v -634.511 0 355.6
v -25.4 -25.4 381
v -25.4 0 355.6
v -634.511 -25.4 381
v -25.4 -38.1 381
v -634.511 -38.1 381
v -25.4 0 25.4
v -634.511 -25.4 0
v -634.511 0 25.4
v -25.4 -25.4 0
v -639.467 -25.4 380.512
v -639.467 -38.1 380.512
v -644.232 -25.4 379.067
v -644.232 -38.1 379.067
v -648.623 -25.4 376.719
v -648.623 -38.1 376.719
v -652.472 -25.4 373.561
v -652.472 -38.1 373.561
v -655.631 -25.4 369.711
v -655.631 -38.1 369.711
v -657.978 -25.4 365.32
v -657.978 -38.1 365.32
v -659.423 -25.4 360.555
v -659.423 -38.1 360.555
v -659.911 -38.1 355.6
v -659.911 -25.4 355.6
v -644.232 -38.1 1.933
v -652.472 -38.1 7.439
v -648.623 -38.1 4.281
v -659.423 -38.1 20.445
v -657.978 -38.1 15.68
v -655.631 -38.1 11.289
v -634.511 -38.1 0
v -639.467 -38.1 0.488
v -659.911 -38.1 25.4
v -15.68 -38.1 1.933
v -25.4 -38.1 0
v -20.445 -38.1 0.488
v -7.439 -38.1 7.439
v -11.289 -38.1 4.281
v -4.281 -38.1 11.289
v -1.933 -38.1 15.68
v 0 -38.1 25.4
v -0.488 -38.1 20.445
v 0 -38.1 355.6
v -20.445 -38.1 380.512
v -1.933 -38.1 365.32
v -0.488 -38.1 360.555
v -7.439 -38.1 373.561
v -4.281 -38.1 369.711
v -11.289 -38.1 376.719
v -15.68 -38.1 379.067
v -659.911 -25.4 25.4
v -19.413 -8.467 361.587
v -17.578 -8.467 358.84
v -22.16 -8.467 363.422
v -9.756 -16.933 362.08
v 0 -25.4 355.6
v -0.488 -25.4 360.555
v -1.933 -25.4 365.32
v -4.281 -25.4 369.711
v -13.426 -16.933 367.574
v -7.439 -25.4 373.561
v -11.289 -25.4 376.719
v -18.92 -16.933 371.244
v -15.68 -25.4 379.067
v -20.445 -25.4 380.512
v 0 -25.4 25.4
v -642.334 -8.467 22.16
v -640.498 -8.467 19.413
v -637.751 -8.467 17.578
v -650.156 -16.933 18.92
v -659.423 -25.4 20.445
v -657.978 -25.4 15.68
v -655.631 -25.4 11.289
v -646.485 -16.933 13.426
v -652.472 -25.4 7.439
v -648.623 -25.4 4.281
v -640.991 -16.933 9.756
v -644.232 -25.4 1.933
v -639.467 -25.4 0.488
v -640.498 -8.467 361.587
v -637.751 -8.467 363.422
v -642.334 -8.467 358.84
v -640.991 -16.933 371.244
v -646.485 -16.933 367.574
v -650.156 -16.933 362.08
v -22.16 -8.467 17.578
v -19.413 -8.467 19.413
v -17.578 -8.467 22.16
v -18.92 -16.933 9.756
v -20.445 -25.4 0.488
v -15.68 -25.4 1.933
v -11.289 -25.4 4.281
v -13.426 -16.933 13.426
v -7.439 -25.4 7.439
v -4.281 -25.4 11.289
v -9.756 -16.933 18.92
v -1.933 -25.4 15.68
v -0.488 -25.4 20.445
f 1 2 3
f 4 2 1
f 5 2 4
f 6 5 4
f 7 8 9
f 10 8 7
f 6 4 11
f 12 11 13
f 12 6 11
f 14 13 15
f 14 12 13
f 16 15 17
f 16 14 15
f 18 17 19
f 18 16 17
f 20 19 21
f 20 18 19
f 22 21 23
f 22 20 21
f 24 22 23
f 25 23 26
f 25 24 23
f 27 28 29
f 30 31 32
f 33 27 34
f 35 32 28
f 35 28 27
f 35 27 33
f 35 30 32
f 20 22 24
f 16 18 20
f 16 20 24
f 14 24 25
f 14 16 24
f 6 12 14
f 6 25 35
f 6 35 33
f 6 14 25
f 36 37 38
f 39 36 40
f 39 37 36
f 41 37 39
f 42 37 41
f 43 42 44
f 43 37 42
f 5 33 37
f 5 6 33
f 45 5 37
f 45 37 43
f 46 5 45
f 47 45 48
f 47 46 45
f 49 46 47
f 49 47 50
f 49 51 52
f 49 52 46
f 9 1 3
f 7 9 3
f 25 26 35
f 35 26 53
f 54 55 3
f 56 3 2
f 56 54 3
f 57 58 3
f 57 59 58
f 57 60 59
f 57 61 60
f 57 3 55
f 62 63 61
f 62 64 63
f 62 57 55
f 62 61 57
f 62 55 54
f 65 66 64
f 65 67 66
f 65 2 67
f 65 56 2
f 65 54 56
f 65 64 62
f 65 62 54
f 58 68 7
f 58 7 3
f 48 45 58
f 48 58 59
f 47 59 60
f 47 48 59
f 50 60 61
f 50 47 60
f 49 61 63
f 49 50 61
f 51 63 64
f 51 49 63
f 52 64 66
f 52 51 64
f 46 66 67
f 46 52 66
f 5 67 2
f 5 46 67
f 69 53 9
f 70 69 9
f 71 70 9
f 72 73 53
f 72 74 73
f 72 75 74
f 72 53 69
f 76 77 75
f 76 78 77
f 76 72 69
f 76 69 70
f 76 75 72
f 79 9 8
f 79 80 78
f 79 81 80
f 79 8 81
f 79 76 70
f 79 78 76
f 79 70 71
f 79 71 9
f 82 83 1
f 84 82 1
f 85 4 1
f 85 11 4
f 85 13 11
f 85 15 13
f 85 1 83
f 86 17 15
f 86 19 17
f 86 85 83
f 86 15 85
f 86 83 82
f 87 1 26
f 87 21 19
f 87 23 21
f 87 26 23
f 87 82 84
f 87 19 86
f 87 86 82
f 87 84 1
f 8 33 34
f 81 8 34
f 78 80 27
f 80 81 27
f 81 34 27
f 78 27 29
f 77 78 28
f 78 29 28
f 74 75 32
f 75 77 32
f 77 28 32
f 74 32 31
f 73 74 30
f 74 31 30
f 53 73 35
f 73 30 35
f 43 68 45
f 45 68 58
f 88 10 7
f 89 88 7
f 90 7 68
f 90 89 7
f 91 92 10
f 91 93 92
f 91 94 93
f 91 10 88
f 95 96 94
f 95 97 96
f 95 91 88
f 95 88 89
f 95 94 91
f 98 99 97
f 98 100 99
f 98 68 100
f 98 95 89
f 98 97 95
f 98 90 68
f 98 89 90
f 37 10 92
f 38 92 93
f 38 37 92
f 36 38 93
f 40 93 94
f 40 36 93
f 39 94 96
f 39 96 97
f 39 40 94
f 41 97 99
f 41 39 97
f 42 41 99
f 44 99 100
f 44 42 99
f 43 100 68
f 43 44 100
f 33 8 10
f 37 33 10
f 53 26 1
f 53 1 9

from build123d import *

# Parameters (mm, degrees)
F1_DEPTH = 38.1
F2_R     = 25.4
F3_SIZE  = 25.4


with BuildPart() as f1:
    # F0 (on Front) → F1 (new body)
    with BuildSketch(Plane.XZ):
        Polygon((-659.911358, 0), (0, 0), (-659.911358, 381), align=None)
        Polygon((-659.911358, 381), (0, 0), (0, 381), align=None)
    extrude(amount=F1_DEPTH)

    # F2
    f2_edges = [f1.edges().sort_by_distance(p)[0] for p in [
        (-659.911358, -19.05, 381),
        (0, -19.05, 381),
        (0, -19.05, 0),
        (-659.911358, -19.05, 0),
    ]]
    fillet(f2_edges, radius=F2_R)

    # F3
    f3_edges = [f1.edges().sort_by_distance(p)[0] for p in [
        (-659.911358, 0, 190.5),
        (-652.47187, 0, 373.560512),
        (-652.47187, 0, 7.439488),
        (-329.955679, 0, 381),
        (-329.955679, 0, 0),
        (-7.439488, 0, 373.560512),
        (-7.439488, 0, 7.439488),
        (0, 0, 190.5),
    ]]
    chamfer(f3_edges, length=F3_SIZE)


solid = f1.part
